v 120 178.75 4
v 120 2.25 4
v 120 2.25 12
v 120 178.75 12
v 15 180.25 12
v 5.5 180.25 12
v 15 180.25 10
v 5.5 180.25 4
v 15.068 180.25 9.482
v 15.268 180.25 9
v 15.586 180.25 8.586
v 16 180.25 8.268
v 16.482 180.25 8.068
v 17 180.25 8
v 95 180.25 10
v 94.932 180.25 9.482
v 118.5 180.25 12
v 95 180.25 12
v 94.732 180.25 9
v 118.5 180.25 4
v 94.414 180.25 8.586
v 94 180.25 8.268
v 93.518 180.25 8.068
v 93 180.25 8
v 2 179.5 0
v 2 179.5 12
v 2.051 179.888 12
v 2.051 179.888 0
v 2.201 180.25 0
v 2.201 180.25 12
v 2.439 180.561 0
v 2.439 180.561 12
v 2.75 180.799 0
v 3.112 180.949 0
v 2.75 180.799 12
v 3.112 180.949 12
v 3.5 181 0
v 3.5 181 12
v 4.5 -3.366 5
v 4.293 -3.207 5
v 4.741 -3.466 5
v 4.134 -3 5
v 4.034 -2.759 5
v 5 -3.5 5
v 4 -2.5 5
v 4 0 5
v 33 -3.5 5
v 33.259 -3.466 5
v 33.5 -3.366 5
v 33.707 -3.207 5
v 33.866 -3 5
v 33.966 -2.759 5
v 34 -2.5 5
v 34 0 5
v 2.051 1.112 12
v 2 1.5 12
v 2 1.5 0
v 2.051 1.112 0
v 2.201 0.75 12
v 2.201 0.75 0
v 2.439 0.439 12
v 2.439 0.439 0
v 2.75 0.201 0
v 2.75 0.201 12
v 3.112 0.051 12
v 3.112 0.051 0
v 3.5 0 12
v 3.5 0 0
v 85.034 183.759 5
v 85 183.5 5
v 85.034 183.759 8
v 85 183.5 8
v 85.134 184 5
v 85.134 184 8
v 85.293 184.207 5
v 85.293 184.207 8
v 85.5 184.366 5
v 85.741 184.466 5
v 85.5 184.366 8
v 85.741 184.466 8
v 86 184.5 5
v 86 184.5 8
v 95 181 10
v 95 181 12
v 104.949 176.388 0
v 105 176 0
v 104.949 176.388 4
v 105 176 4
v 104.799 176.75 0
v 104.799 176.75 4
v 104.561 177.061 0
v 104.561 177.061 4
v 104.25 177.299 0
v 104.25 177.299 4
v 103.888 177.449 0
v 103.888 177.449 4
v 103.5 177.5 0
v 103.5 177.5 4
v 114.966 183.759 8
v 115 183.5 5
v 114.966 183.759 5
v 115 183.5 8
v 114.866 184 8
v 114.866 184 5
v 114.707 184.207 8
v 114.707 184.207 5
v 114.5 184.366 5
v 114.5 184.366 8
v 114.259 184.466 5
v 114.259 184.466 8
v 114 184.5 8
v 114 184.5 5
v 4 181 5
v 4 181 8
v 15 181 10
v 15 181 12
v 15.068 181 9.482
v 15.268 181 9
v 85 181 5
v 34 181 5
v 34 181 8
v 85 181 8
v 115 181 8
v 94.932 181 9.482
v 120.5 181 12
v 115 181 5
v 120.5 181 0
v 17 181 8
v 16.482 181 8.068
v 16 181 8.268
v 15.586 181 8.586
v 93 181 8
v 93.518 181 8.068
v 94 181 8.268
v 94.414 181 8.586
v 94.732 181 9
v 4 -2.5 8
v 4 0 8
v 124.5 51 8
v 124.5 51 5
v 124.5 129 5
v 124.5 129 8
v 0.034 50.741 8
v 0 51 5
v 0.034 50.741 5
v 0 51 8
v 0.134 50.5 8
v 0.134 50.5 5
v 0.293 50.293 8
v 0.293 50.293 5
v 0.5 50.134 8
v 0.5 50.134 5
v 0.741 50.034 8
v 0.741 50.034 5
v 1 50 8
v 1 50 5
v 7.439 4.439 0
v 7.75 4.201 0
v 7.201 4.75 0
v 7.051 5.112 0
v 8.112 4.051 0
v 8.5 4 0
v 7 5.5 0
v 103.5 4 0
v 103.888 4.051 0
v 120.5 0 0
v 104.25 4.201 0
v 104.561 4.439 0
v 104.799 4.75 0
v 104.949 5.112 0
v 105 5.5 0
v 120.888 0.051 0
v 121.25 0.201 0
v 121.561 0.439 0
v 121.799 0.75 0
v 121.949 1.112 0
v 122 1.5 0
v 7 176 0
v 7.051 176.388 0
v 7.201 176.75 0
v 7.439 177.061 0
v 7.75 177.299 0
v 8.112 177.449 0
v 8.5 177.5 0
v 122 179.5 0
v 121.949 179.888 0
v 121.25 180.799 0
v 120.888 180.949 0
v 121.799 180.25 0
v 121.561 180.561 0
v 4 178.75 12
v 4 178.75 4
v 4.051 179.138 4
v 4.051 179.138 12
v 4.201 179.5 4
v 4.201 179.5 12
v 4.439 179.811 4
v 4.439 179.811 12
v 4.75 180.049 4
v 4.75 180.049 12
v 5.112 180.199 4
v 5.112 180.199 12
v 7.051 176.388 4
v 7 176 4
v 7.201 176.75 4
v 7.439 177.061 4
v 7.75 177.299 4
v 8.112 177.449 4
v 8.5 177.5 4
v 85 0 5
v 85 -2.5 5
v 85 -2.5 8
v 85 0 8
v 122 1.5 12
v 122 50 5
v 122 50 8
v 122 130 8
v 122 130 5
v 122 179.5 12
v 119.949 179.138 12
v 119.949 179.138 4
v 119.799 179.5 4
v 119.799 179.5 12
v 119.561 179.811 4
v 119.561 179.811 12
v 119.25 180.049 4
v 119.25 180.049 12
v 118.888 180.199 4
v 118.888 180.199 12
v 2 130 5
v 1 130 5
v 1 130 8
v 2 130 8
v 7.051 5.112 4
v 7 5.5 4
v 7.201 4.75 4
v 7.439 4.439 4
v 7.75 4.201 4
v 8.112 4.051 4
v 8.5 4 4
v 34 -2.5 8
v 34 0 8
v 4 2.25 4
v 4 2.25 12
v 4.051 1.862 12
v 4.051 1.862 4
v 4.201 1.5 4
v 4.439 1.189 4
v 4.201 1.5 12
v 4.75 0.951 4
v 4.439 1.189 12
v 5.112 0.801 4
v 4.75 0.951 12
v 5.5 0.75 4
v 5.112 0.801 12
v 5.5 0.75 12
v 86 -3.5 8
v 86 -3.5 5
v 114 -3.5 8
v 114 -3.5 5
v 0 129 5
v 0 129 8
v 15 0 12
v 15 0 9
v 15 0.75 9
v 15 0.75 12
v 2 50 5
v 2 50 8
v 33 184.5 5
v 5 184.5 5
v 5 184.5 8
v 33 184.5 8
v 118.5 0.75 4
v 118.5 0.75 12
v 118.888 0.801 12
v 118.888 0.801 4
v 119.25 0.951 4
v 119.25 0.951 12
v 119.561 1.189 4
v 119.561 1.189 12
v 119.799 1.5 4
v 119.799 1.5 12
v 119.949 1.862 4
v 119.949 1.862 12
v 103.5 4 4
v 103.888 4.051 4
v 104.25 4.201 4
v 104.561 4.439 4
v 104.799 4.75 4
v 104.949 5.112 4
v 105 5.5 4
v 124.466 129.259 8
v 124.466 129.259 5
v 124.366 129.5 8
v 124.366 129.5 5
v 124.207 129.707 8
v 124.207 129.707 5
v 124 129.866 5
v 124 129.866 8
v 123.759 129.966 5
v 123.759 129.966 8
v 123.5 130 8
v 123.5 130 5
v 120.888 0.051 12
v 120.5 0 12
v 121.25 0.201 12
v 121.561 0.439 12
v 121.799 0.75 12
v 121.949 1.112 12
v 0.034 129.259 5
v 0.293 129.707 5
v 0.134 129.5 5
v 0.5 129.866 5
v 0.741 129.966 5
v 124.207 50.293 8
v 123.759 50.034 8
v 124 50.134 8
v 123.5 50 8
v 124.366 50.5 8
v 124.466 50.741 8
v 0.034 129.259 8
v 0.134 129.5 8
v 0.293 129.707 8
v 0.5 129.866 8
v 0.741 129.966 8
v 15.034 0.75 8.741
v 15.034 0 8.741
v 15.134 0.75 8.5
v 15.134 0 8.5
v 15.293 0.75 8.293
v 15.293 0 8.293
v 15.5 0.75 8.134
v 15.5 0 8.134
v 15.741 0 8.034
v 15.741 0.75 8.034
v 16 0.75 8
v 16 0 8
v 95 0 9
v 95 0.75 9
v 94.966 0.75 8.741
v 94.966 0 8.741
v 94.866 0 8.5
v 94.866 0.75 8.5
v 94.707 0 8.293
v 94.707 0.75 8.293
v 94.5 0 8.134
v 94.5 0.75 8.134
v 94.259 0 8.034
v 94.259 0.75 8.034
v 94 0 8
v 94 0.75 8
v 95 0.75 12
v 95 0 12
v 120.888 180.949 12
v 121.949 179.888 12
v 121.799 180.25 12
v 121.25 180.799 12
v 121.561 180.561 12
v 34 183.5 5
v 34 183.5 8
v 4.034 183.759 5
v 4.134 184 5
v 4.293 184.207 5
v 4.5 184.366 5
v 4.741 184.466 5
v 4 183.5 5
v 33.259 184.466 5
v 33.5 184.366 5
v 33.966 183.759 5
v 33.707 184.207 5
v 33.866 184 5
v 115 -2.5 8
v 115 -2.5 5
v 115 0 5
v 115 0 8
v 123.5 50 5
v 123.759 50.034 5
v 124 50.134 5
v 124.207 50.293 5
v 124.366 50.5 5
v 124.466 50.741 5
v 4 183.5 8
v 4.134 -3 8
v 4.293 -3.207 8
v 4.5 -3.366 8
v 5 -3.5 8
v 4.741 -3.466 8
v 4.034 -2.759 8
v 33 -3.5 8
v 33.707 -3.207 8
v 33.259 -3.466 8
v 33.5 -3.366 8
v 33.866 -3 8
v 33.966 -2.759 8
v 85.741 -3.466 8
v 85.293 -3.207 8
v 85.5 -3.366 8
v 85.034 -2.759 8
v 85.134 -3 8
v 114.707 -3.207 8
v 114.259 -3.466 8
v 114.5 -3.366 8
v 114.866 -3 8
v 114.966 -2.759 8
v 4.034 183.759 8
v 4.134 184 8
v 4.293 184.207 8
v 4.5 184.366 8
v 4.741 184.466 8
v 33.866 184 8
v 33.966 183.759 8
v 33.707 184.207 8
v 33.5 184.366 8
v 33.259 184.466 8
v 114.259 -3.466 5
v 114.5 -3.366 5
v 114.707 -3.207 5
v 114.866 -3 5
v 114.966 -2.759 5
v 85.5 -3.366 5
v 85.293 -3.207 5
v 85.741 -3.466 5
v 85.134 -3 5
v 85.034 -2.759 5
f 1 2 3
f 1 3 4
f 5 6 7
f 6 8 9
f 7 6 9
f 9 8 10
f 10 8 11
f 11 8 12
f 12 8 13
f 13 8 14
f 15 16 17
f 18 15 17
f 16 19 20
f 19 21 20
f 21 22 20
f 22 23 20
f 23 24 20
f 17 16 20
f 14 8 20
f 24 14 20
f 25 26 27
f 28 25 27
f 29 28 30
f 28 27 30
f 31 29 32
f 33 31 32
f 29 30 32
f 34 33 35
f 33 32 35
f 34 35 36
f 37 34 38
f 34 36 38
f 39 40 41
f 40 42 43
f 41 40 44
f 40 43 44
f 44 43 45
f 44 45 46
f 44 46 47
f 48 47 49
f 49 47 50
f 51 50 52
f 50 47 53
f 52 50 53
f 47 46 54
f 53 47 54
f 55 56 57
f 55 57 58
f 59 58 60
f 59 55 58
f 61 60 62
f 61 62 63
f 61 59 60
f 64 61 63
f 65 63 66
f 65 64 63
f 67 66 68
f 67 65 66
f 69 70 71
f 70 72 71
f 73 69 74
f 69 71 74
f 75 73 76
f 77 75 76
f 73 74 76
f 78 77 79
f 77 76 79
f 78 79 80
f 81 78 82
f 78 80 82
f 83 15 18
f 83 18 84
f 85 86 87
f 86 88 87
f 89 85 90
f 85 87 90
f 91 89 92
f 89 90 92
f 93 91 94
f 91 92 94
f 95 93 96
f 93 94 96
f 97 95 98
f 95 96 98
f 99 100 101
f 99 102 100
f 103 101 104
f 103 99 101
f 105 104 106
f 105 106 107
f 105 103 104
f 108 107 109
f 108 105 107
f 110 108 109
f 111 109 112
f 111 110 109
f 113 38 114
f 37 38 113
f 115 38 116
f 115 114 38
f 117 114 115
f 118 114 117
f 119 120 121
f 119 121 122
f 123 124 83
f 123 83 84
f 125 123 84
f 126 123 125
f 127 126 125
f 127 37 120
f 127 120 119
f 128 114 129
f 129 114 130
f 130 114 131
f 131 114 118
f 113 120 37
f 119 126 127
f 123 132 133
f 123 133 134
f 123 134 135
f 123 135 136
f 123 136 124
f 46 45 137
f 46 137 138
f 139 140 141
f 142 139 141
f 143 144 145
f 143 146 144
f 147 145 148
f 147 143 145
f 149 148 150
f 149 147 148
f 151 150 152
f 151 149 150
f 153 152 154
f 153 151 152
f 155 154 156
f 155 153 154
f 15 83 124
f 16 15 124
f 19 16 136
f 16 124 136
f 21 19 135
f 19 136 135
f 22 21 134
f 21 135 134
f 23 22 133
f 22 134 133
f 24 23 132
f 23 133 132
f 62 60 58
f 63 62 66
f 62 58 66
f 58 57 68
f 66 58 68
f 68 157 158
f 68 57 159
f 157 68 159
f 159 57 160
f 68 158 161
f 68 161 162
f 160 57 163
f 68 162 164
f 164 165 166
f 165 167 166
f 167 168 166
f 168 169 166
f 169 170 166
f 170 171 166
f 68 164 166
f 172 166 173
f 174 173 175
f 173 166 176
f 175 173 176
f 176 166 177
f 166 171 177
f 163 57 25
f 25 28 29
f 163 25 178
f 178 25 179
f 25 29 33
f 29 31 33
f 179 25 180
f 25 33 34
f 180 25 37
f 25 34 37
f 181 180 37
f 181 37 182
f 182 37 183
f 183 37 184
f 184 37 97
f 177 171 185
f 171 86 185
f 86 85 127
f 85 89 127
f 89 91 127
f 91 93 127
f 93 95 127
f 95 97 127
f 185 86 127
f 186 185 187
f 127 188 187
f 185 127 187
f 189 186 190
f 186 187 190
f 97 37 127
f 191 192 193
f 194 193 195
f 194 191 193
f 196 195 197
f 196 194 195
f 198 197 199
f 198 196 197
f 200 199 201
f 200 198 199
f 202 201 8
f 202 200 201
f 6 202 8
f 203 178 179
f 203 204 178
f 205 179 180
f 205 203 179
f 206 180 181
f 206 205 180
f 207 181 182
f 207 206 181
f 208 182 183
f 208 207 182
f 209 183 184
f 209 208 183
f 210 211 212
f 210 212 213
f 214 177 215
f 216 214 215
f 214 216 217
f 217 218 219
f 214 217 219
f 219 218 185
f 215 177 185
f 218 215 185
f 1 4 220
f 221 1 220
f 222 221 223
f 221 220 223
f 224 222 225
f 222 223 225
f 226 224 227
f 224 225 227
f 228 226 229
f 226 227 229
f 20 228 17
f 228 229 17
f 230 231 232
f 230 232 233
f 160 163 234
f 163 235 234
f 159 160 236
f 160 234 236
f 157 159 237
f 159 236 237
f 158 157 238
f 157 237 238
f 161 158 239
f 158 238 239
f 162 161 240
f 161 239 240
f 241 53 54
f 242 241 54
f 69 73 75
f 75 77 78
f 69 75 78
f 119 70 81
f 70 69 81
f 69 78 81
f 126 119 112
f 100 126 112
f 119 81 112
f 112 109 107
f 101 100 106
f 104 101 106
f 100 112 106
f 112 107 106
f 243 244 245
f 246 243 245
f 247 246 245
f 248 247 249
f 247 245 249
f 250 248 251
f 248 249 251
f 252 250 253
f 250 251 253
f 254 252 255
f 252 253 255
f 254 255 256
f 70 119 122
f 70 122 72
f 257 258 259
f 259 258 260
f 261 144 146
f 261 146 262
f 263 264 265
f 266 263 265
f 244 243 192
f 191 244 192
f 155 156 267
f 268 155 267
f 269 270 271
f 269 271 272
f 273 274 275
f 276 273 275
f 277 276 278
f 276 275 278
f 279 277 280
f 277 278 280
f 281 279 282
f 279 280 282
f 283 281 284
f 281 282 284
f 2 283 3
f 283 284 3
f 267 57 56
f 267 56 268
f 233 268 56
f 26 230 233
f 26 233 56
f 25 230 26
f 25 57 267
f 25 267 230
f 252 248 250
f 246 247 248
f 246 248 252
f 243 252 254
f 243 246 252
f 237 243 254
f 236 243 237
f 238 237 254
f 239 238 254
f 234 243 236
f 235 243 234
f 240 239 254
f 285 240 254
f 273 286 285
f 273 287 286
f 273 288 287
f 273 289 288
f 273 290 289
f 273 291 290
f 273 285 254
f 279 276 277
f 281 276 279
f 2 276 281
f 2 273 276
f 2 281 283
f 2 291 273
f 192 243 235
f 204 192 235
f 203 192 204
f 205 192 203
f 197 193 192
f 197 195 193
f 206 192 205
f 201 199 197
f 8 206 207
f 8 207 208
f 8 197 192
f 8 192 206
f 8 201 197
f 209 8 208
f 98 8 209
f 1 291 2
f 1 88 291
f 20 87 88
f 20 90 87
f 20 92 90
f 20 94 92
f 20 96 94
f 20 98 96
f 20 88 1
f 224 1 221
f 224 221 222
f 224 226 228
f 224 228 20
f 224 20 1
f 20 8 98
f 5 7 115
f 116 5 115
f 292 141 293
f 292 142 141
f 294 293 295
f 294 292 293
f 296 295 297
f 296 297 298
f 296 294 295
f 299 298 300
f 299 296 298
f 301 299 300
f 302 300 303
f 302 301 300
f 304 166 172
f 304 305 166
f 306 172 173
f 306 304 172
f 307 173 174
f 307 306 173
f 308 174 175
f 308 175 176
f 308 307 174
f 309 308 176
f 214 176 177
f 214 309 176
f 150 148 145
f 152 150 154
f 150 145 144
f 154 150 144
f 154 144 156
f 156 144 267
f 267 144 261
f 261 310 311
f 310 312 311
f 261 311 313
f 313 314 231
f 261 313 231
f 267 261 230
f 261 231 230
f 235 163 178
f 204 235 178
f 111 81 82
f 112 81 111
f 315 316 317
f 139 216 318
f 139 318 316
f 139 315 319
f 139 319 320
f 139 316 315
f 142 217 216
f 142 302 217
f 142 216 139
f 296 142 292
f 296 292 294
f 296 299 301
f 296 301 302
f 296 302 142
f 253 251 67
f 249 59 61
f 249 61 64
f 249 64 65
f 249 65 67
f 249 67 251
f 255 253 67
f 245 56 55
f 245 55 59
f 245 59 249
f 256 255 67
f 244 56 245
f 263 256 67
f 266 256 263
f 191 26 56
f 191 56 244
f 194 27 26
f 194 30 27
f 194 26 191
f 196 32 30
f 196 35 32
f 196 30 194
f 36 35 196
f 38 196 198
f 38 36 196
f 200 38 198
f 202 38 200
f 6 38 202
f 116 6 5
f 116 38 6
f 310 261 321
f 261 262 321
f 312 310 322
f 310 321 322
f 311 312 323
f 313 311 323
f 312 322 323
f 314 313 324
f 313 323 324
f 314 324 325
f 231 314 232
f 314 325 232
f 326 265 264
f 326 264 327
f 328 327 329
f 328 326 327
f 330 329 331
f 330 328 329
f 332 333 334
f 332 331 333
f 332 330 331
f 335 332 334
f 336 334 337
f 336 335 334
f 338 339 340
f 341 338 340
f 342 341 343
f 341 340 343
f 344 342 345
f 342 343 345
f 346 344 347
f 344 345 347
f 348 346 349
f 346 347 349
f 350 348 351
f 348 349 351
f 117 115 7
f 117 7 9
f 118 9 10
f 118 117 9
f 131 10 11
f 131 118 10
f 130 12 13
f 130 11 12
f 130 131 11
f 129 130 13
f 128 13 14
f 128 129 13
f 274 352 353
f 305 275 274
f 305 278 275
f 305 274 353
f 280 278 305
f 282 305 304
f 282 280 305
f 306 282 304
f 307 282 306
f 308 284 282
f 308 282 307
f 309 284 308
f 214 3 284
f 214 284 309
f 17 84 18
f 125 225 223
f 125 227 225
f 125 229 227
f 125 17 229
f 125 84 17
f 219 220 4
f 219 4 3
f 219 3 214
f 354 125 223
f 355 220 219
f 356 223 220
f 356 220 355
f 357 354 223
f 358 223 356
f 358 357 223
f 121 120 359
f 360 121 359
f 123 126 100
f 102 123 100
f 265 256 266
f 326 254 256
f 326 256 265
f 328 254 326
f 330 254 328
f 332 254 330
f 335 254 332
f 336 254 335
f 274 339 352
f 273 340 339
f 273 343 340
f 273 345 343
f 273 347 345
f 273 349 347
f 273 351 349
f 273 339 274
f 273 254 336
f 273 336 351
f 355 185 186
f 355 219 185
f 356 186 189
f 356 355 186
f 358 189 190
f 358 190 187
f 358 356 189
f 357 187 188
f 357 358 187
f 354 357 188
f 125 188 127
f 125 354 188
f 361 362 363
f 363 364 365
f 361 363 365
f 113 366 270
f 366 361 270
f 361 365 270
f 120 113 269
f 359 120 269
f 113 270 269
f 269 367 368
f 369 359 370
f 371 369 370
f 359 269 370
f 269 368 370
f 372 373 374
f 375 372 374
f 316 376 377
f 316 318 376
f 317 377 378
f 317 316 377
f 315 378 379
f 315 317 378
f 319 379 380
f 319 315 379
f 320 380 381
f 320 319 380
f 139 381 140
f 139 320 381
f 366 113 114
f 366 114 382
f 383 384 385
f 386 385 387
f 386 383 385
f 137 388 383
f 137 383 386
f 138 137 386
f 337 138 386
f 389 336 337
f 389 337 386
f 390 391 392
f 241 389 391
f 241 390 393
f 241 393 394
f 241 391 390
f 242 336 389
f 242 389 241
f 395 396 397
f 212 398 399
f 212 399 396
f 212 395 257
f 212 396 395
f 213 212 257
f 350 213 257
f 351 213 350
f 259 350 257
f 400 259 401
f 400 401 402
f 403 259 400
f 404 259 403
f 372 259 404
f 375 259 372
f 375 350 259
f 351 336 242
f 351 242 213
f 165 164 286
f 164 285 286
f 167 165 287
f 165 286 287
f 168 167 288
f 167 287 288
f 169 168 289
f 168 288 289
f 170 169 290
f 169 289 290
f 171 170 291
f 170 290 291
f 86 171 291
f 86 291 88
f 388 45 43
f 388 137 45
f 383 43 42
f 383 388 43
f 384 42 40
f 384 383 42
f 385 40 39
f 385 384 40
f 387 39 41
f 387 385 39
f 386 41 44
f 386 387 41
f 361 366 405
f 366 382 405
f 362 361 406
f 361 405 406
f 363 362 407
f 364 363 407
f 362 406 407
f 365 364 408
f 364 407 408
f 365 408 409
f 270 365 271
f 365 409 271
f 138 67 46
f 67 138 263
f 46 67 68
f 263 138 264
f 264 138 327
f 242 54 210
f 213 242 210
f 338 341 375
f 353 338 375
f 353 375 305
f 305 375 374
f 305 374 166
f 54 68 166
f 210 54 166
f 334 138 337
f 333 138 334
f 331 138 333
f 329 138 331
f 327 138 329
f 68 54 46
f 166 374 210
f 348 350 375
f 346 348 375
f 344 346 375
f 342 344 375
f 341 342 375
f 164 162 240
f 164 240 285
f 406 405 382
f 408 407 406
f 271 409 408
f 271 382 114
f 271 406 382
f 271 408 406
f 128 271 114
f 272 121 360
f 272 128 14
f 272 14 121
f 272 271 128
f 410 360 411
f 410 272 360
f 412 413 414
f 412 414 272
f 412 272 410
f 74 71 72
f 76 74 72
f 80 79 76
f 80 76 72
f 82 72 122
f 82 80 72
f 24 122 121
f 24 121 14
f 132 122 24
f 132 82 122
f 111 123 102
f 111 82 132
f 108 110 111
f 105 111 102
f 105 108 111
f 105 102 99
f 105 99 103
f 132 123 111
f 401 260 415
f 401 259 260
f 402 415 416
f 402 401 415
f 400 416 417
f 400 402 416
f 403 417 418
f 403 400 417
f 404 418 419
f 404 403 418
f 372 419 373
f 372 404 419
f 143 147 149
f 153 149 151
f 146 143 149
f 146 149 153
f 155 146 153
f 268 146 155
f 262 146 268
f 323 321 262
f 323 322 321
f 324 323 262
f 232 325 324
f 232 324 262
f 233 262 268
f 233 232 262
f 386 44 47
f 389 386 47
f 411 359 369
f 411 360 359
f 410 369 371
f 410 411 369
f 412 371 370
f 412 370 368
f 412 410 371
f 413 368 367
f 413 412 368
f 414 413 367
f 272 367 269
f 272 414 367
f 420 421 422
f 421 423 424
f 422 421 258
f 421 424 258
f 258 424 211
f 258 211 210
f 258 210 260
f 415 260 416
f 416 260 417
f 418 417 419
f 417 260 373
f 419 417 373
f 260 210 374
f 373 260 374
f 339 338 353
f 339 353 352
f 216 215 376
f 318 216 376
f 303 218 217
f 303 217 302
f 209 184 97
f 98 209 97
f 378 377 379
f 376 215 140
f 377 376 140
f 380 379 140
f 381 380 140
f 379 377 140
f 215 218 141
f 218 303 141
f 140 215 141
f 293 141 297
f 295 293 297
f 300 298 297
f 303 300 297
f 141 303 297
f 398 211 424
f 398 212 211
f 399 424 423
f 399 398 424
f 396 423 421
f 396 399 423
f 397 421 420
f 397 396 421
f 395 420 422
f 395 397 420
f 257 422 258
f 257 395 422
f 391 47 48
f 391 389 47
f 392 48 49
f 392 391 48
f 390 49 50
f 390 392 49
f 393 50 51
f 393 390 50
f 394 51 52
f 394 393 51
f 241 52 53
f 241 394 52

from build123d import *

# Parameters (mm, degrees)
BOX011_W      = 4
BOX011_H      = 80
BOX011_DEPTH  = 3
FILLET006_R   = 1
BOX010_W      = 30
BOX010_H      = 4
BOX010_DEPTH  = 3
FILLET007_R   = 1
BOX009_W      = 30
BOX009_H      = 4
BOX009_DEPTH  = 3
FILLET008_R   = 1
BOX008_W      = 30
BOX008_H      = 4
BOX008_DEPTH  = 3
FILLET009_R   = 1
BOX013_W      = 4
BOX013_H      = 80
BOX013_DEPTH  = 3
FILLET010_R   = 1
BOX012_W      = 30
BOX012_H      = 4
BOX012_DEPTH  = 3
FILLET005_R   = 1
BOX006_W      = 80
BOX006_H      = 10
BOX006_DEPTH  = 10
BOX007_W      = 80
BOX007_H      = 10
BOX007_DEPTH  = 10
FILLET004_1_R = 2
FILLET004_2_R = 1
BOX003_W      = 116
BOX003_H      = 179.5
BOX003_DEPTH  = 10
FILLET002_R   = 1.5
BOX002_W      = 120
BOX002_H      = 181
BOX002_DEPTH  = 8
FILLET003_R   = 1.5
BOX001_W      = 98
BOX001_H      = 173.5
BOX001_DEPTH  = 4
FILLET_R      = 1.5
BOX_W         = 120
BOX_H         = 181
BOX_DEPTH     = 4
FILLET001_R   = 1.5


with BuildPart() as fillet006:
    # Box011 → Box011 (new body)
    with BuildSketch(Plane(origin=(0, 50, 5), x_dir=(1, 0, 0), z_dir=(0, 0, 1))):
        with Locations((2, 40)):
            Rectangle(BOX011_W, BOX011_H)
    extrude(amount=BOX011_DEPTH)

    # Fillet006
    fillet006_edges = [fillet006.edges().sort_by_distance(p)[0] for p in [
        (0, 50, 6.5),
        (0, 130, 6.5),
    ]]
    fillet(fillet006_edges, radius=FILLET006_R)


with BuildPart() as fillet007:
    # Box010 → Box010 (new body)
    with BuildSketch(Plane(origin=(85, -3.5, 5), x_dir=(1, 0, 0), z_dir=(0, 0, 1))):
        with Locations((15, 2)):
            Rectangle(BOX010_W, BOX010_H)
    extrude(amount=BOX010_DEPTH)

    # Fillet007
    fillet007_edges = [fillet007.edges().sort_by_distance(p)[0] for p in [
        (85, -3.5, 6.5),
        (115, -3.5, 6.5),
    ]]
    fillet(fillet007_edges, radius=FILLET007_R)


with BuildPart() as fillet008:
    # Box009 → Box009 (new body)
    with BuildSketch(Plane(origin=(4, 180.5, 5), x_dir=(1, 0, 0), z_dir=(0, 0, 1))):
        with Locations((15, 2)):
            Rectangle(BOX009_W, BOX009_H)
    extrude(amount=BOX009_DEPTH)

    # Fillet008
    fillet008_edges = [fillet008.edges().sort_by_distance(p)[0] for p in [
        (4, 184.5, 6.5),
        (34, 184.5, 6.5),
    ]]
    fillet(fillet008_edges, radius=FILLET008_R)


with BuildPart() as fillet009:
    # Box008 → Box008 (new body)
    with BuildSketch(Plane(origin=(85, 180.5, 5), x_dir=(1, 0, 0), z_dir=(0, 0, 1))):
        with Locations((15, 2)):
            Rectangle(BOX008_W, BOX008_H)
    extrude(amount=BOX008_DEPTH)

    # Fillet009
    fillet009_edges = [fillet009.edges().sort_by_distance(p)[0] for p in [
        (85, 184.5, 6.5),
        (115, 184.5, 6.5),
    ]]
    fillet(fillet009_edges, radius=FILLET009_R)


with BuildPart() as fillet010:
    # Box013 → Box013 (new body)
    with BuildSketch(Plane(origin=(120.5, 50, 5), x_dir=(1, 0, 0), z_dir=(0, 0, 1))):
        with Locations((2, 40)):
            Rectangle(BOX013_W, BOX013_H)
    extrude(amount=BOX013_DEPTH)

    # Fillet010
    fillet010_edges = [fillet010.edges().sort_by_distance(p)[0] for p in [
        (124.5, 50, 6.5),
        (124.5, 130, 6.5),
    ]]
    fillet(fillet010_edges, radius=FILLET010_R)


with BuildPart() as fusion002:
    # Box012 → Box012 (new body)
    with BuildSketch(Plane(origin=(4, -3.5, 5), x_dir=(1, 0, 0), z_dir=(0, 0, 1))):
        with Locations((15, 2)):
            Rectangle(BOX012_W, BOX012_H)
    extrude(amount=BOX012_DEPTH)

    # Fillet005
    fillet005_edges = [fusion002.edges().sort_by_distance(p)[0] for p in [
        (4, -3.5, 6.5),
        (34, -3.5, 6.5),
    ]]
    fillet(fillet005_edges, radius=FILLET005_R)

    # Fusion002: union Fillet006, Fillet007, Fillet008, Fillet009, Fillet010
    add(fillet006.part)
    add(fillet007.part)
    add(fillet008.part)
    add(fillet009.part)
    add(fillet010.part)


with BuildPart() as cube006:
    # Box006 → Box006 (new body)
    with BuildSketch(Plane(origin=(15, -5, 0), x_dir=(1, 0, 0), z_dir=(0, 0, 1))):
        with Locations((40, 5)):
            Rectangle(BOX006_W, BOX006_H)
    extrude(amount=BOX006_DEPTH)


with BuildPart() as fillet004:
    # Box007 → Box007 (new body)
    with BuildSketch(Plane(origin=(15, 175, 0), x_dir=(1, 0, 0), z_dir=(0, 0, 1))):
        with Locations((40, 5)):
            Rectangle(BOX007_W, BOX007_H)
    extrude(amount=BOX007_DEPTH)

    # Fusion: union Cube006
    add(cube006.part)


with BuildPart() as fillet004_1:
    # Fusion placement: moved
    add(fillet004.part.moved(Location((0, 0, 8))))

    # Fillet004 1
    fillet004_1_edges = [fillet004_1.edges().sort_by_distance(p)[0] for p in [
        (15, 180, 8),
        (95, 180, 8),
    ]]
    fillet(fillet004_1_edges, radius=FILLET004_1_R)

    # Fillet004 2
    fillet004_2_edges = [fillet004_1.edges().sort_by_distance(p)[0] for p in [
        (15, 0, 8),
        (95, 0, 8),
    ]]
    fillet(fillet004_2_edges, radius=FILLET004_2_R)


with BuildPart() as fillet002:
    # Box003 → Box003 (new body)
    with BuildSketch(Plane(origin=(4, 0.75, 4), x_dir=(1, 0, 0), z_dir=(0, 0, 1))):
        with Locations((58, 89.75)):
            Rectangle(BOX003_W, BOX003_H)
    extrude(amount=BOX003_DEPTH)

    # Fillet002
    fillet002_edges = [fillet002.edges().sort_by_distance(p)[0] for p in [
        (4, 0.75, 9),
        (4, 180.25, 9),
        (120, 0.75, 9),
        (120, 180.25, 9),
    ]]
    fillet(fillet002_edges, radius=FILLET002_R)


with BuildPart() as cut002:
    # Box002 → Box002 (new body)
    with BuildSketch(Plane(origin=(2, 0, 4), x_dir=(1, 0, 0), z_dir=(0, 0, 1))):
        with Locations((60, 90.5)):
            Rectangle(BOX002_W, BOX002_H)
    extrude(amount=BOX002_DEPTH)

    # Fillet003
    fillet003_edges = [cut002.edges().sort_by_distance(p)[0] for p in [
        (2, 0, 8),
        (2, 181, 8),
        (122, 0, 8),
        (122, 181, 8),
    ]]
    fillet(fillet003_edges, radius=FILLET003_R)

    # Cut001: cut Fillet002
    add(fillet002.part, mode=Mode.SUBTRACT)

    # Cut002: cut Fillet004
    add(fillet004_1.part, mode=Mode.SUBTRACT)


with BuildPart() as fillet_body:
    # Box001 → Box001 (new body)
    with BuildSketch(Plane(origin=(7, 4, 0), x_dir=(1, 0, 0), z_dir=(0, 0, 1))):
        with Locations((49, 86.75)):
            Rectangle(BOX001_W, BOX001_H)
    extrude(amount=BOX001_DEPTH)

    # Fillet
    fillet_edges = [fillet_body.edges().sort_by_distance(p)[0] for p in [
        (7, 4, 2),
        (7, 177.5, 2),
        (105, 4, 2),
        (105, 177.5, 2),
    ]]
    fillet(fillet_edges, radius=FILLET_R)


with BuildPart() as fusion003:
    # Box → Box (new body)
    with BuildSketch(Plane(origin=(2, 0, 0), x_dir=(1, 0, 0), z_dir=(0, 0, 1))):
        with Locations((60, 90.5)):
            Rectangle(BOX_W, BOX_H)
    extrude(amount=BOX_DEPTH)

    # Fillet001
    fillet001_edges = [fusion003.edges().sort_by_distance(p)[0] for p in [
        (2, 0, 2),
        (2, 181, 2),
        (122, 0, 2),
        (122, 181, 2),
    ]]
    fillet(fillet001_edges, radius=FILLET001_R)

    # Cut: cut Fillet body
    add(fillet_body.part, mode=Mode.SUBTRACT)

    # Fusion001: union Cut002
    add(cut002.part)

    # Fusion003: union Fusion002
    add(fusion002.part)


solid = fusion003.part
